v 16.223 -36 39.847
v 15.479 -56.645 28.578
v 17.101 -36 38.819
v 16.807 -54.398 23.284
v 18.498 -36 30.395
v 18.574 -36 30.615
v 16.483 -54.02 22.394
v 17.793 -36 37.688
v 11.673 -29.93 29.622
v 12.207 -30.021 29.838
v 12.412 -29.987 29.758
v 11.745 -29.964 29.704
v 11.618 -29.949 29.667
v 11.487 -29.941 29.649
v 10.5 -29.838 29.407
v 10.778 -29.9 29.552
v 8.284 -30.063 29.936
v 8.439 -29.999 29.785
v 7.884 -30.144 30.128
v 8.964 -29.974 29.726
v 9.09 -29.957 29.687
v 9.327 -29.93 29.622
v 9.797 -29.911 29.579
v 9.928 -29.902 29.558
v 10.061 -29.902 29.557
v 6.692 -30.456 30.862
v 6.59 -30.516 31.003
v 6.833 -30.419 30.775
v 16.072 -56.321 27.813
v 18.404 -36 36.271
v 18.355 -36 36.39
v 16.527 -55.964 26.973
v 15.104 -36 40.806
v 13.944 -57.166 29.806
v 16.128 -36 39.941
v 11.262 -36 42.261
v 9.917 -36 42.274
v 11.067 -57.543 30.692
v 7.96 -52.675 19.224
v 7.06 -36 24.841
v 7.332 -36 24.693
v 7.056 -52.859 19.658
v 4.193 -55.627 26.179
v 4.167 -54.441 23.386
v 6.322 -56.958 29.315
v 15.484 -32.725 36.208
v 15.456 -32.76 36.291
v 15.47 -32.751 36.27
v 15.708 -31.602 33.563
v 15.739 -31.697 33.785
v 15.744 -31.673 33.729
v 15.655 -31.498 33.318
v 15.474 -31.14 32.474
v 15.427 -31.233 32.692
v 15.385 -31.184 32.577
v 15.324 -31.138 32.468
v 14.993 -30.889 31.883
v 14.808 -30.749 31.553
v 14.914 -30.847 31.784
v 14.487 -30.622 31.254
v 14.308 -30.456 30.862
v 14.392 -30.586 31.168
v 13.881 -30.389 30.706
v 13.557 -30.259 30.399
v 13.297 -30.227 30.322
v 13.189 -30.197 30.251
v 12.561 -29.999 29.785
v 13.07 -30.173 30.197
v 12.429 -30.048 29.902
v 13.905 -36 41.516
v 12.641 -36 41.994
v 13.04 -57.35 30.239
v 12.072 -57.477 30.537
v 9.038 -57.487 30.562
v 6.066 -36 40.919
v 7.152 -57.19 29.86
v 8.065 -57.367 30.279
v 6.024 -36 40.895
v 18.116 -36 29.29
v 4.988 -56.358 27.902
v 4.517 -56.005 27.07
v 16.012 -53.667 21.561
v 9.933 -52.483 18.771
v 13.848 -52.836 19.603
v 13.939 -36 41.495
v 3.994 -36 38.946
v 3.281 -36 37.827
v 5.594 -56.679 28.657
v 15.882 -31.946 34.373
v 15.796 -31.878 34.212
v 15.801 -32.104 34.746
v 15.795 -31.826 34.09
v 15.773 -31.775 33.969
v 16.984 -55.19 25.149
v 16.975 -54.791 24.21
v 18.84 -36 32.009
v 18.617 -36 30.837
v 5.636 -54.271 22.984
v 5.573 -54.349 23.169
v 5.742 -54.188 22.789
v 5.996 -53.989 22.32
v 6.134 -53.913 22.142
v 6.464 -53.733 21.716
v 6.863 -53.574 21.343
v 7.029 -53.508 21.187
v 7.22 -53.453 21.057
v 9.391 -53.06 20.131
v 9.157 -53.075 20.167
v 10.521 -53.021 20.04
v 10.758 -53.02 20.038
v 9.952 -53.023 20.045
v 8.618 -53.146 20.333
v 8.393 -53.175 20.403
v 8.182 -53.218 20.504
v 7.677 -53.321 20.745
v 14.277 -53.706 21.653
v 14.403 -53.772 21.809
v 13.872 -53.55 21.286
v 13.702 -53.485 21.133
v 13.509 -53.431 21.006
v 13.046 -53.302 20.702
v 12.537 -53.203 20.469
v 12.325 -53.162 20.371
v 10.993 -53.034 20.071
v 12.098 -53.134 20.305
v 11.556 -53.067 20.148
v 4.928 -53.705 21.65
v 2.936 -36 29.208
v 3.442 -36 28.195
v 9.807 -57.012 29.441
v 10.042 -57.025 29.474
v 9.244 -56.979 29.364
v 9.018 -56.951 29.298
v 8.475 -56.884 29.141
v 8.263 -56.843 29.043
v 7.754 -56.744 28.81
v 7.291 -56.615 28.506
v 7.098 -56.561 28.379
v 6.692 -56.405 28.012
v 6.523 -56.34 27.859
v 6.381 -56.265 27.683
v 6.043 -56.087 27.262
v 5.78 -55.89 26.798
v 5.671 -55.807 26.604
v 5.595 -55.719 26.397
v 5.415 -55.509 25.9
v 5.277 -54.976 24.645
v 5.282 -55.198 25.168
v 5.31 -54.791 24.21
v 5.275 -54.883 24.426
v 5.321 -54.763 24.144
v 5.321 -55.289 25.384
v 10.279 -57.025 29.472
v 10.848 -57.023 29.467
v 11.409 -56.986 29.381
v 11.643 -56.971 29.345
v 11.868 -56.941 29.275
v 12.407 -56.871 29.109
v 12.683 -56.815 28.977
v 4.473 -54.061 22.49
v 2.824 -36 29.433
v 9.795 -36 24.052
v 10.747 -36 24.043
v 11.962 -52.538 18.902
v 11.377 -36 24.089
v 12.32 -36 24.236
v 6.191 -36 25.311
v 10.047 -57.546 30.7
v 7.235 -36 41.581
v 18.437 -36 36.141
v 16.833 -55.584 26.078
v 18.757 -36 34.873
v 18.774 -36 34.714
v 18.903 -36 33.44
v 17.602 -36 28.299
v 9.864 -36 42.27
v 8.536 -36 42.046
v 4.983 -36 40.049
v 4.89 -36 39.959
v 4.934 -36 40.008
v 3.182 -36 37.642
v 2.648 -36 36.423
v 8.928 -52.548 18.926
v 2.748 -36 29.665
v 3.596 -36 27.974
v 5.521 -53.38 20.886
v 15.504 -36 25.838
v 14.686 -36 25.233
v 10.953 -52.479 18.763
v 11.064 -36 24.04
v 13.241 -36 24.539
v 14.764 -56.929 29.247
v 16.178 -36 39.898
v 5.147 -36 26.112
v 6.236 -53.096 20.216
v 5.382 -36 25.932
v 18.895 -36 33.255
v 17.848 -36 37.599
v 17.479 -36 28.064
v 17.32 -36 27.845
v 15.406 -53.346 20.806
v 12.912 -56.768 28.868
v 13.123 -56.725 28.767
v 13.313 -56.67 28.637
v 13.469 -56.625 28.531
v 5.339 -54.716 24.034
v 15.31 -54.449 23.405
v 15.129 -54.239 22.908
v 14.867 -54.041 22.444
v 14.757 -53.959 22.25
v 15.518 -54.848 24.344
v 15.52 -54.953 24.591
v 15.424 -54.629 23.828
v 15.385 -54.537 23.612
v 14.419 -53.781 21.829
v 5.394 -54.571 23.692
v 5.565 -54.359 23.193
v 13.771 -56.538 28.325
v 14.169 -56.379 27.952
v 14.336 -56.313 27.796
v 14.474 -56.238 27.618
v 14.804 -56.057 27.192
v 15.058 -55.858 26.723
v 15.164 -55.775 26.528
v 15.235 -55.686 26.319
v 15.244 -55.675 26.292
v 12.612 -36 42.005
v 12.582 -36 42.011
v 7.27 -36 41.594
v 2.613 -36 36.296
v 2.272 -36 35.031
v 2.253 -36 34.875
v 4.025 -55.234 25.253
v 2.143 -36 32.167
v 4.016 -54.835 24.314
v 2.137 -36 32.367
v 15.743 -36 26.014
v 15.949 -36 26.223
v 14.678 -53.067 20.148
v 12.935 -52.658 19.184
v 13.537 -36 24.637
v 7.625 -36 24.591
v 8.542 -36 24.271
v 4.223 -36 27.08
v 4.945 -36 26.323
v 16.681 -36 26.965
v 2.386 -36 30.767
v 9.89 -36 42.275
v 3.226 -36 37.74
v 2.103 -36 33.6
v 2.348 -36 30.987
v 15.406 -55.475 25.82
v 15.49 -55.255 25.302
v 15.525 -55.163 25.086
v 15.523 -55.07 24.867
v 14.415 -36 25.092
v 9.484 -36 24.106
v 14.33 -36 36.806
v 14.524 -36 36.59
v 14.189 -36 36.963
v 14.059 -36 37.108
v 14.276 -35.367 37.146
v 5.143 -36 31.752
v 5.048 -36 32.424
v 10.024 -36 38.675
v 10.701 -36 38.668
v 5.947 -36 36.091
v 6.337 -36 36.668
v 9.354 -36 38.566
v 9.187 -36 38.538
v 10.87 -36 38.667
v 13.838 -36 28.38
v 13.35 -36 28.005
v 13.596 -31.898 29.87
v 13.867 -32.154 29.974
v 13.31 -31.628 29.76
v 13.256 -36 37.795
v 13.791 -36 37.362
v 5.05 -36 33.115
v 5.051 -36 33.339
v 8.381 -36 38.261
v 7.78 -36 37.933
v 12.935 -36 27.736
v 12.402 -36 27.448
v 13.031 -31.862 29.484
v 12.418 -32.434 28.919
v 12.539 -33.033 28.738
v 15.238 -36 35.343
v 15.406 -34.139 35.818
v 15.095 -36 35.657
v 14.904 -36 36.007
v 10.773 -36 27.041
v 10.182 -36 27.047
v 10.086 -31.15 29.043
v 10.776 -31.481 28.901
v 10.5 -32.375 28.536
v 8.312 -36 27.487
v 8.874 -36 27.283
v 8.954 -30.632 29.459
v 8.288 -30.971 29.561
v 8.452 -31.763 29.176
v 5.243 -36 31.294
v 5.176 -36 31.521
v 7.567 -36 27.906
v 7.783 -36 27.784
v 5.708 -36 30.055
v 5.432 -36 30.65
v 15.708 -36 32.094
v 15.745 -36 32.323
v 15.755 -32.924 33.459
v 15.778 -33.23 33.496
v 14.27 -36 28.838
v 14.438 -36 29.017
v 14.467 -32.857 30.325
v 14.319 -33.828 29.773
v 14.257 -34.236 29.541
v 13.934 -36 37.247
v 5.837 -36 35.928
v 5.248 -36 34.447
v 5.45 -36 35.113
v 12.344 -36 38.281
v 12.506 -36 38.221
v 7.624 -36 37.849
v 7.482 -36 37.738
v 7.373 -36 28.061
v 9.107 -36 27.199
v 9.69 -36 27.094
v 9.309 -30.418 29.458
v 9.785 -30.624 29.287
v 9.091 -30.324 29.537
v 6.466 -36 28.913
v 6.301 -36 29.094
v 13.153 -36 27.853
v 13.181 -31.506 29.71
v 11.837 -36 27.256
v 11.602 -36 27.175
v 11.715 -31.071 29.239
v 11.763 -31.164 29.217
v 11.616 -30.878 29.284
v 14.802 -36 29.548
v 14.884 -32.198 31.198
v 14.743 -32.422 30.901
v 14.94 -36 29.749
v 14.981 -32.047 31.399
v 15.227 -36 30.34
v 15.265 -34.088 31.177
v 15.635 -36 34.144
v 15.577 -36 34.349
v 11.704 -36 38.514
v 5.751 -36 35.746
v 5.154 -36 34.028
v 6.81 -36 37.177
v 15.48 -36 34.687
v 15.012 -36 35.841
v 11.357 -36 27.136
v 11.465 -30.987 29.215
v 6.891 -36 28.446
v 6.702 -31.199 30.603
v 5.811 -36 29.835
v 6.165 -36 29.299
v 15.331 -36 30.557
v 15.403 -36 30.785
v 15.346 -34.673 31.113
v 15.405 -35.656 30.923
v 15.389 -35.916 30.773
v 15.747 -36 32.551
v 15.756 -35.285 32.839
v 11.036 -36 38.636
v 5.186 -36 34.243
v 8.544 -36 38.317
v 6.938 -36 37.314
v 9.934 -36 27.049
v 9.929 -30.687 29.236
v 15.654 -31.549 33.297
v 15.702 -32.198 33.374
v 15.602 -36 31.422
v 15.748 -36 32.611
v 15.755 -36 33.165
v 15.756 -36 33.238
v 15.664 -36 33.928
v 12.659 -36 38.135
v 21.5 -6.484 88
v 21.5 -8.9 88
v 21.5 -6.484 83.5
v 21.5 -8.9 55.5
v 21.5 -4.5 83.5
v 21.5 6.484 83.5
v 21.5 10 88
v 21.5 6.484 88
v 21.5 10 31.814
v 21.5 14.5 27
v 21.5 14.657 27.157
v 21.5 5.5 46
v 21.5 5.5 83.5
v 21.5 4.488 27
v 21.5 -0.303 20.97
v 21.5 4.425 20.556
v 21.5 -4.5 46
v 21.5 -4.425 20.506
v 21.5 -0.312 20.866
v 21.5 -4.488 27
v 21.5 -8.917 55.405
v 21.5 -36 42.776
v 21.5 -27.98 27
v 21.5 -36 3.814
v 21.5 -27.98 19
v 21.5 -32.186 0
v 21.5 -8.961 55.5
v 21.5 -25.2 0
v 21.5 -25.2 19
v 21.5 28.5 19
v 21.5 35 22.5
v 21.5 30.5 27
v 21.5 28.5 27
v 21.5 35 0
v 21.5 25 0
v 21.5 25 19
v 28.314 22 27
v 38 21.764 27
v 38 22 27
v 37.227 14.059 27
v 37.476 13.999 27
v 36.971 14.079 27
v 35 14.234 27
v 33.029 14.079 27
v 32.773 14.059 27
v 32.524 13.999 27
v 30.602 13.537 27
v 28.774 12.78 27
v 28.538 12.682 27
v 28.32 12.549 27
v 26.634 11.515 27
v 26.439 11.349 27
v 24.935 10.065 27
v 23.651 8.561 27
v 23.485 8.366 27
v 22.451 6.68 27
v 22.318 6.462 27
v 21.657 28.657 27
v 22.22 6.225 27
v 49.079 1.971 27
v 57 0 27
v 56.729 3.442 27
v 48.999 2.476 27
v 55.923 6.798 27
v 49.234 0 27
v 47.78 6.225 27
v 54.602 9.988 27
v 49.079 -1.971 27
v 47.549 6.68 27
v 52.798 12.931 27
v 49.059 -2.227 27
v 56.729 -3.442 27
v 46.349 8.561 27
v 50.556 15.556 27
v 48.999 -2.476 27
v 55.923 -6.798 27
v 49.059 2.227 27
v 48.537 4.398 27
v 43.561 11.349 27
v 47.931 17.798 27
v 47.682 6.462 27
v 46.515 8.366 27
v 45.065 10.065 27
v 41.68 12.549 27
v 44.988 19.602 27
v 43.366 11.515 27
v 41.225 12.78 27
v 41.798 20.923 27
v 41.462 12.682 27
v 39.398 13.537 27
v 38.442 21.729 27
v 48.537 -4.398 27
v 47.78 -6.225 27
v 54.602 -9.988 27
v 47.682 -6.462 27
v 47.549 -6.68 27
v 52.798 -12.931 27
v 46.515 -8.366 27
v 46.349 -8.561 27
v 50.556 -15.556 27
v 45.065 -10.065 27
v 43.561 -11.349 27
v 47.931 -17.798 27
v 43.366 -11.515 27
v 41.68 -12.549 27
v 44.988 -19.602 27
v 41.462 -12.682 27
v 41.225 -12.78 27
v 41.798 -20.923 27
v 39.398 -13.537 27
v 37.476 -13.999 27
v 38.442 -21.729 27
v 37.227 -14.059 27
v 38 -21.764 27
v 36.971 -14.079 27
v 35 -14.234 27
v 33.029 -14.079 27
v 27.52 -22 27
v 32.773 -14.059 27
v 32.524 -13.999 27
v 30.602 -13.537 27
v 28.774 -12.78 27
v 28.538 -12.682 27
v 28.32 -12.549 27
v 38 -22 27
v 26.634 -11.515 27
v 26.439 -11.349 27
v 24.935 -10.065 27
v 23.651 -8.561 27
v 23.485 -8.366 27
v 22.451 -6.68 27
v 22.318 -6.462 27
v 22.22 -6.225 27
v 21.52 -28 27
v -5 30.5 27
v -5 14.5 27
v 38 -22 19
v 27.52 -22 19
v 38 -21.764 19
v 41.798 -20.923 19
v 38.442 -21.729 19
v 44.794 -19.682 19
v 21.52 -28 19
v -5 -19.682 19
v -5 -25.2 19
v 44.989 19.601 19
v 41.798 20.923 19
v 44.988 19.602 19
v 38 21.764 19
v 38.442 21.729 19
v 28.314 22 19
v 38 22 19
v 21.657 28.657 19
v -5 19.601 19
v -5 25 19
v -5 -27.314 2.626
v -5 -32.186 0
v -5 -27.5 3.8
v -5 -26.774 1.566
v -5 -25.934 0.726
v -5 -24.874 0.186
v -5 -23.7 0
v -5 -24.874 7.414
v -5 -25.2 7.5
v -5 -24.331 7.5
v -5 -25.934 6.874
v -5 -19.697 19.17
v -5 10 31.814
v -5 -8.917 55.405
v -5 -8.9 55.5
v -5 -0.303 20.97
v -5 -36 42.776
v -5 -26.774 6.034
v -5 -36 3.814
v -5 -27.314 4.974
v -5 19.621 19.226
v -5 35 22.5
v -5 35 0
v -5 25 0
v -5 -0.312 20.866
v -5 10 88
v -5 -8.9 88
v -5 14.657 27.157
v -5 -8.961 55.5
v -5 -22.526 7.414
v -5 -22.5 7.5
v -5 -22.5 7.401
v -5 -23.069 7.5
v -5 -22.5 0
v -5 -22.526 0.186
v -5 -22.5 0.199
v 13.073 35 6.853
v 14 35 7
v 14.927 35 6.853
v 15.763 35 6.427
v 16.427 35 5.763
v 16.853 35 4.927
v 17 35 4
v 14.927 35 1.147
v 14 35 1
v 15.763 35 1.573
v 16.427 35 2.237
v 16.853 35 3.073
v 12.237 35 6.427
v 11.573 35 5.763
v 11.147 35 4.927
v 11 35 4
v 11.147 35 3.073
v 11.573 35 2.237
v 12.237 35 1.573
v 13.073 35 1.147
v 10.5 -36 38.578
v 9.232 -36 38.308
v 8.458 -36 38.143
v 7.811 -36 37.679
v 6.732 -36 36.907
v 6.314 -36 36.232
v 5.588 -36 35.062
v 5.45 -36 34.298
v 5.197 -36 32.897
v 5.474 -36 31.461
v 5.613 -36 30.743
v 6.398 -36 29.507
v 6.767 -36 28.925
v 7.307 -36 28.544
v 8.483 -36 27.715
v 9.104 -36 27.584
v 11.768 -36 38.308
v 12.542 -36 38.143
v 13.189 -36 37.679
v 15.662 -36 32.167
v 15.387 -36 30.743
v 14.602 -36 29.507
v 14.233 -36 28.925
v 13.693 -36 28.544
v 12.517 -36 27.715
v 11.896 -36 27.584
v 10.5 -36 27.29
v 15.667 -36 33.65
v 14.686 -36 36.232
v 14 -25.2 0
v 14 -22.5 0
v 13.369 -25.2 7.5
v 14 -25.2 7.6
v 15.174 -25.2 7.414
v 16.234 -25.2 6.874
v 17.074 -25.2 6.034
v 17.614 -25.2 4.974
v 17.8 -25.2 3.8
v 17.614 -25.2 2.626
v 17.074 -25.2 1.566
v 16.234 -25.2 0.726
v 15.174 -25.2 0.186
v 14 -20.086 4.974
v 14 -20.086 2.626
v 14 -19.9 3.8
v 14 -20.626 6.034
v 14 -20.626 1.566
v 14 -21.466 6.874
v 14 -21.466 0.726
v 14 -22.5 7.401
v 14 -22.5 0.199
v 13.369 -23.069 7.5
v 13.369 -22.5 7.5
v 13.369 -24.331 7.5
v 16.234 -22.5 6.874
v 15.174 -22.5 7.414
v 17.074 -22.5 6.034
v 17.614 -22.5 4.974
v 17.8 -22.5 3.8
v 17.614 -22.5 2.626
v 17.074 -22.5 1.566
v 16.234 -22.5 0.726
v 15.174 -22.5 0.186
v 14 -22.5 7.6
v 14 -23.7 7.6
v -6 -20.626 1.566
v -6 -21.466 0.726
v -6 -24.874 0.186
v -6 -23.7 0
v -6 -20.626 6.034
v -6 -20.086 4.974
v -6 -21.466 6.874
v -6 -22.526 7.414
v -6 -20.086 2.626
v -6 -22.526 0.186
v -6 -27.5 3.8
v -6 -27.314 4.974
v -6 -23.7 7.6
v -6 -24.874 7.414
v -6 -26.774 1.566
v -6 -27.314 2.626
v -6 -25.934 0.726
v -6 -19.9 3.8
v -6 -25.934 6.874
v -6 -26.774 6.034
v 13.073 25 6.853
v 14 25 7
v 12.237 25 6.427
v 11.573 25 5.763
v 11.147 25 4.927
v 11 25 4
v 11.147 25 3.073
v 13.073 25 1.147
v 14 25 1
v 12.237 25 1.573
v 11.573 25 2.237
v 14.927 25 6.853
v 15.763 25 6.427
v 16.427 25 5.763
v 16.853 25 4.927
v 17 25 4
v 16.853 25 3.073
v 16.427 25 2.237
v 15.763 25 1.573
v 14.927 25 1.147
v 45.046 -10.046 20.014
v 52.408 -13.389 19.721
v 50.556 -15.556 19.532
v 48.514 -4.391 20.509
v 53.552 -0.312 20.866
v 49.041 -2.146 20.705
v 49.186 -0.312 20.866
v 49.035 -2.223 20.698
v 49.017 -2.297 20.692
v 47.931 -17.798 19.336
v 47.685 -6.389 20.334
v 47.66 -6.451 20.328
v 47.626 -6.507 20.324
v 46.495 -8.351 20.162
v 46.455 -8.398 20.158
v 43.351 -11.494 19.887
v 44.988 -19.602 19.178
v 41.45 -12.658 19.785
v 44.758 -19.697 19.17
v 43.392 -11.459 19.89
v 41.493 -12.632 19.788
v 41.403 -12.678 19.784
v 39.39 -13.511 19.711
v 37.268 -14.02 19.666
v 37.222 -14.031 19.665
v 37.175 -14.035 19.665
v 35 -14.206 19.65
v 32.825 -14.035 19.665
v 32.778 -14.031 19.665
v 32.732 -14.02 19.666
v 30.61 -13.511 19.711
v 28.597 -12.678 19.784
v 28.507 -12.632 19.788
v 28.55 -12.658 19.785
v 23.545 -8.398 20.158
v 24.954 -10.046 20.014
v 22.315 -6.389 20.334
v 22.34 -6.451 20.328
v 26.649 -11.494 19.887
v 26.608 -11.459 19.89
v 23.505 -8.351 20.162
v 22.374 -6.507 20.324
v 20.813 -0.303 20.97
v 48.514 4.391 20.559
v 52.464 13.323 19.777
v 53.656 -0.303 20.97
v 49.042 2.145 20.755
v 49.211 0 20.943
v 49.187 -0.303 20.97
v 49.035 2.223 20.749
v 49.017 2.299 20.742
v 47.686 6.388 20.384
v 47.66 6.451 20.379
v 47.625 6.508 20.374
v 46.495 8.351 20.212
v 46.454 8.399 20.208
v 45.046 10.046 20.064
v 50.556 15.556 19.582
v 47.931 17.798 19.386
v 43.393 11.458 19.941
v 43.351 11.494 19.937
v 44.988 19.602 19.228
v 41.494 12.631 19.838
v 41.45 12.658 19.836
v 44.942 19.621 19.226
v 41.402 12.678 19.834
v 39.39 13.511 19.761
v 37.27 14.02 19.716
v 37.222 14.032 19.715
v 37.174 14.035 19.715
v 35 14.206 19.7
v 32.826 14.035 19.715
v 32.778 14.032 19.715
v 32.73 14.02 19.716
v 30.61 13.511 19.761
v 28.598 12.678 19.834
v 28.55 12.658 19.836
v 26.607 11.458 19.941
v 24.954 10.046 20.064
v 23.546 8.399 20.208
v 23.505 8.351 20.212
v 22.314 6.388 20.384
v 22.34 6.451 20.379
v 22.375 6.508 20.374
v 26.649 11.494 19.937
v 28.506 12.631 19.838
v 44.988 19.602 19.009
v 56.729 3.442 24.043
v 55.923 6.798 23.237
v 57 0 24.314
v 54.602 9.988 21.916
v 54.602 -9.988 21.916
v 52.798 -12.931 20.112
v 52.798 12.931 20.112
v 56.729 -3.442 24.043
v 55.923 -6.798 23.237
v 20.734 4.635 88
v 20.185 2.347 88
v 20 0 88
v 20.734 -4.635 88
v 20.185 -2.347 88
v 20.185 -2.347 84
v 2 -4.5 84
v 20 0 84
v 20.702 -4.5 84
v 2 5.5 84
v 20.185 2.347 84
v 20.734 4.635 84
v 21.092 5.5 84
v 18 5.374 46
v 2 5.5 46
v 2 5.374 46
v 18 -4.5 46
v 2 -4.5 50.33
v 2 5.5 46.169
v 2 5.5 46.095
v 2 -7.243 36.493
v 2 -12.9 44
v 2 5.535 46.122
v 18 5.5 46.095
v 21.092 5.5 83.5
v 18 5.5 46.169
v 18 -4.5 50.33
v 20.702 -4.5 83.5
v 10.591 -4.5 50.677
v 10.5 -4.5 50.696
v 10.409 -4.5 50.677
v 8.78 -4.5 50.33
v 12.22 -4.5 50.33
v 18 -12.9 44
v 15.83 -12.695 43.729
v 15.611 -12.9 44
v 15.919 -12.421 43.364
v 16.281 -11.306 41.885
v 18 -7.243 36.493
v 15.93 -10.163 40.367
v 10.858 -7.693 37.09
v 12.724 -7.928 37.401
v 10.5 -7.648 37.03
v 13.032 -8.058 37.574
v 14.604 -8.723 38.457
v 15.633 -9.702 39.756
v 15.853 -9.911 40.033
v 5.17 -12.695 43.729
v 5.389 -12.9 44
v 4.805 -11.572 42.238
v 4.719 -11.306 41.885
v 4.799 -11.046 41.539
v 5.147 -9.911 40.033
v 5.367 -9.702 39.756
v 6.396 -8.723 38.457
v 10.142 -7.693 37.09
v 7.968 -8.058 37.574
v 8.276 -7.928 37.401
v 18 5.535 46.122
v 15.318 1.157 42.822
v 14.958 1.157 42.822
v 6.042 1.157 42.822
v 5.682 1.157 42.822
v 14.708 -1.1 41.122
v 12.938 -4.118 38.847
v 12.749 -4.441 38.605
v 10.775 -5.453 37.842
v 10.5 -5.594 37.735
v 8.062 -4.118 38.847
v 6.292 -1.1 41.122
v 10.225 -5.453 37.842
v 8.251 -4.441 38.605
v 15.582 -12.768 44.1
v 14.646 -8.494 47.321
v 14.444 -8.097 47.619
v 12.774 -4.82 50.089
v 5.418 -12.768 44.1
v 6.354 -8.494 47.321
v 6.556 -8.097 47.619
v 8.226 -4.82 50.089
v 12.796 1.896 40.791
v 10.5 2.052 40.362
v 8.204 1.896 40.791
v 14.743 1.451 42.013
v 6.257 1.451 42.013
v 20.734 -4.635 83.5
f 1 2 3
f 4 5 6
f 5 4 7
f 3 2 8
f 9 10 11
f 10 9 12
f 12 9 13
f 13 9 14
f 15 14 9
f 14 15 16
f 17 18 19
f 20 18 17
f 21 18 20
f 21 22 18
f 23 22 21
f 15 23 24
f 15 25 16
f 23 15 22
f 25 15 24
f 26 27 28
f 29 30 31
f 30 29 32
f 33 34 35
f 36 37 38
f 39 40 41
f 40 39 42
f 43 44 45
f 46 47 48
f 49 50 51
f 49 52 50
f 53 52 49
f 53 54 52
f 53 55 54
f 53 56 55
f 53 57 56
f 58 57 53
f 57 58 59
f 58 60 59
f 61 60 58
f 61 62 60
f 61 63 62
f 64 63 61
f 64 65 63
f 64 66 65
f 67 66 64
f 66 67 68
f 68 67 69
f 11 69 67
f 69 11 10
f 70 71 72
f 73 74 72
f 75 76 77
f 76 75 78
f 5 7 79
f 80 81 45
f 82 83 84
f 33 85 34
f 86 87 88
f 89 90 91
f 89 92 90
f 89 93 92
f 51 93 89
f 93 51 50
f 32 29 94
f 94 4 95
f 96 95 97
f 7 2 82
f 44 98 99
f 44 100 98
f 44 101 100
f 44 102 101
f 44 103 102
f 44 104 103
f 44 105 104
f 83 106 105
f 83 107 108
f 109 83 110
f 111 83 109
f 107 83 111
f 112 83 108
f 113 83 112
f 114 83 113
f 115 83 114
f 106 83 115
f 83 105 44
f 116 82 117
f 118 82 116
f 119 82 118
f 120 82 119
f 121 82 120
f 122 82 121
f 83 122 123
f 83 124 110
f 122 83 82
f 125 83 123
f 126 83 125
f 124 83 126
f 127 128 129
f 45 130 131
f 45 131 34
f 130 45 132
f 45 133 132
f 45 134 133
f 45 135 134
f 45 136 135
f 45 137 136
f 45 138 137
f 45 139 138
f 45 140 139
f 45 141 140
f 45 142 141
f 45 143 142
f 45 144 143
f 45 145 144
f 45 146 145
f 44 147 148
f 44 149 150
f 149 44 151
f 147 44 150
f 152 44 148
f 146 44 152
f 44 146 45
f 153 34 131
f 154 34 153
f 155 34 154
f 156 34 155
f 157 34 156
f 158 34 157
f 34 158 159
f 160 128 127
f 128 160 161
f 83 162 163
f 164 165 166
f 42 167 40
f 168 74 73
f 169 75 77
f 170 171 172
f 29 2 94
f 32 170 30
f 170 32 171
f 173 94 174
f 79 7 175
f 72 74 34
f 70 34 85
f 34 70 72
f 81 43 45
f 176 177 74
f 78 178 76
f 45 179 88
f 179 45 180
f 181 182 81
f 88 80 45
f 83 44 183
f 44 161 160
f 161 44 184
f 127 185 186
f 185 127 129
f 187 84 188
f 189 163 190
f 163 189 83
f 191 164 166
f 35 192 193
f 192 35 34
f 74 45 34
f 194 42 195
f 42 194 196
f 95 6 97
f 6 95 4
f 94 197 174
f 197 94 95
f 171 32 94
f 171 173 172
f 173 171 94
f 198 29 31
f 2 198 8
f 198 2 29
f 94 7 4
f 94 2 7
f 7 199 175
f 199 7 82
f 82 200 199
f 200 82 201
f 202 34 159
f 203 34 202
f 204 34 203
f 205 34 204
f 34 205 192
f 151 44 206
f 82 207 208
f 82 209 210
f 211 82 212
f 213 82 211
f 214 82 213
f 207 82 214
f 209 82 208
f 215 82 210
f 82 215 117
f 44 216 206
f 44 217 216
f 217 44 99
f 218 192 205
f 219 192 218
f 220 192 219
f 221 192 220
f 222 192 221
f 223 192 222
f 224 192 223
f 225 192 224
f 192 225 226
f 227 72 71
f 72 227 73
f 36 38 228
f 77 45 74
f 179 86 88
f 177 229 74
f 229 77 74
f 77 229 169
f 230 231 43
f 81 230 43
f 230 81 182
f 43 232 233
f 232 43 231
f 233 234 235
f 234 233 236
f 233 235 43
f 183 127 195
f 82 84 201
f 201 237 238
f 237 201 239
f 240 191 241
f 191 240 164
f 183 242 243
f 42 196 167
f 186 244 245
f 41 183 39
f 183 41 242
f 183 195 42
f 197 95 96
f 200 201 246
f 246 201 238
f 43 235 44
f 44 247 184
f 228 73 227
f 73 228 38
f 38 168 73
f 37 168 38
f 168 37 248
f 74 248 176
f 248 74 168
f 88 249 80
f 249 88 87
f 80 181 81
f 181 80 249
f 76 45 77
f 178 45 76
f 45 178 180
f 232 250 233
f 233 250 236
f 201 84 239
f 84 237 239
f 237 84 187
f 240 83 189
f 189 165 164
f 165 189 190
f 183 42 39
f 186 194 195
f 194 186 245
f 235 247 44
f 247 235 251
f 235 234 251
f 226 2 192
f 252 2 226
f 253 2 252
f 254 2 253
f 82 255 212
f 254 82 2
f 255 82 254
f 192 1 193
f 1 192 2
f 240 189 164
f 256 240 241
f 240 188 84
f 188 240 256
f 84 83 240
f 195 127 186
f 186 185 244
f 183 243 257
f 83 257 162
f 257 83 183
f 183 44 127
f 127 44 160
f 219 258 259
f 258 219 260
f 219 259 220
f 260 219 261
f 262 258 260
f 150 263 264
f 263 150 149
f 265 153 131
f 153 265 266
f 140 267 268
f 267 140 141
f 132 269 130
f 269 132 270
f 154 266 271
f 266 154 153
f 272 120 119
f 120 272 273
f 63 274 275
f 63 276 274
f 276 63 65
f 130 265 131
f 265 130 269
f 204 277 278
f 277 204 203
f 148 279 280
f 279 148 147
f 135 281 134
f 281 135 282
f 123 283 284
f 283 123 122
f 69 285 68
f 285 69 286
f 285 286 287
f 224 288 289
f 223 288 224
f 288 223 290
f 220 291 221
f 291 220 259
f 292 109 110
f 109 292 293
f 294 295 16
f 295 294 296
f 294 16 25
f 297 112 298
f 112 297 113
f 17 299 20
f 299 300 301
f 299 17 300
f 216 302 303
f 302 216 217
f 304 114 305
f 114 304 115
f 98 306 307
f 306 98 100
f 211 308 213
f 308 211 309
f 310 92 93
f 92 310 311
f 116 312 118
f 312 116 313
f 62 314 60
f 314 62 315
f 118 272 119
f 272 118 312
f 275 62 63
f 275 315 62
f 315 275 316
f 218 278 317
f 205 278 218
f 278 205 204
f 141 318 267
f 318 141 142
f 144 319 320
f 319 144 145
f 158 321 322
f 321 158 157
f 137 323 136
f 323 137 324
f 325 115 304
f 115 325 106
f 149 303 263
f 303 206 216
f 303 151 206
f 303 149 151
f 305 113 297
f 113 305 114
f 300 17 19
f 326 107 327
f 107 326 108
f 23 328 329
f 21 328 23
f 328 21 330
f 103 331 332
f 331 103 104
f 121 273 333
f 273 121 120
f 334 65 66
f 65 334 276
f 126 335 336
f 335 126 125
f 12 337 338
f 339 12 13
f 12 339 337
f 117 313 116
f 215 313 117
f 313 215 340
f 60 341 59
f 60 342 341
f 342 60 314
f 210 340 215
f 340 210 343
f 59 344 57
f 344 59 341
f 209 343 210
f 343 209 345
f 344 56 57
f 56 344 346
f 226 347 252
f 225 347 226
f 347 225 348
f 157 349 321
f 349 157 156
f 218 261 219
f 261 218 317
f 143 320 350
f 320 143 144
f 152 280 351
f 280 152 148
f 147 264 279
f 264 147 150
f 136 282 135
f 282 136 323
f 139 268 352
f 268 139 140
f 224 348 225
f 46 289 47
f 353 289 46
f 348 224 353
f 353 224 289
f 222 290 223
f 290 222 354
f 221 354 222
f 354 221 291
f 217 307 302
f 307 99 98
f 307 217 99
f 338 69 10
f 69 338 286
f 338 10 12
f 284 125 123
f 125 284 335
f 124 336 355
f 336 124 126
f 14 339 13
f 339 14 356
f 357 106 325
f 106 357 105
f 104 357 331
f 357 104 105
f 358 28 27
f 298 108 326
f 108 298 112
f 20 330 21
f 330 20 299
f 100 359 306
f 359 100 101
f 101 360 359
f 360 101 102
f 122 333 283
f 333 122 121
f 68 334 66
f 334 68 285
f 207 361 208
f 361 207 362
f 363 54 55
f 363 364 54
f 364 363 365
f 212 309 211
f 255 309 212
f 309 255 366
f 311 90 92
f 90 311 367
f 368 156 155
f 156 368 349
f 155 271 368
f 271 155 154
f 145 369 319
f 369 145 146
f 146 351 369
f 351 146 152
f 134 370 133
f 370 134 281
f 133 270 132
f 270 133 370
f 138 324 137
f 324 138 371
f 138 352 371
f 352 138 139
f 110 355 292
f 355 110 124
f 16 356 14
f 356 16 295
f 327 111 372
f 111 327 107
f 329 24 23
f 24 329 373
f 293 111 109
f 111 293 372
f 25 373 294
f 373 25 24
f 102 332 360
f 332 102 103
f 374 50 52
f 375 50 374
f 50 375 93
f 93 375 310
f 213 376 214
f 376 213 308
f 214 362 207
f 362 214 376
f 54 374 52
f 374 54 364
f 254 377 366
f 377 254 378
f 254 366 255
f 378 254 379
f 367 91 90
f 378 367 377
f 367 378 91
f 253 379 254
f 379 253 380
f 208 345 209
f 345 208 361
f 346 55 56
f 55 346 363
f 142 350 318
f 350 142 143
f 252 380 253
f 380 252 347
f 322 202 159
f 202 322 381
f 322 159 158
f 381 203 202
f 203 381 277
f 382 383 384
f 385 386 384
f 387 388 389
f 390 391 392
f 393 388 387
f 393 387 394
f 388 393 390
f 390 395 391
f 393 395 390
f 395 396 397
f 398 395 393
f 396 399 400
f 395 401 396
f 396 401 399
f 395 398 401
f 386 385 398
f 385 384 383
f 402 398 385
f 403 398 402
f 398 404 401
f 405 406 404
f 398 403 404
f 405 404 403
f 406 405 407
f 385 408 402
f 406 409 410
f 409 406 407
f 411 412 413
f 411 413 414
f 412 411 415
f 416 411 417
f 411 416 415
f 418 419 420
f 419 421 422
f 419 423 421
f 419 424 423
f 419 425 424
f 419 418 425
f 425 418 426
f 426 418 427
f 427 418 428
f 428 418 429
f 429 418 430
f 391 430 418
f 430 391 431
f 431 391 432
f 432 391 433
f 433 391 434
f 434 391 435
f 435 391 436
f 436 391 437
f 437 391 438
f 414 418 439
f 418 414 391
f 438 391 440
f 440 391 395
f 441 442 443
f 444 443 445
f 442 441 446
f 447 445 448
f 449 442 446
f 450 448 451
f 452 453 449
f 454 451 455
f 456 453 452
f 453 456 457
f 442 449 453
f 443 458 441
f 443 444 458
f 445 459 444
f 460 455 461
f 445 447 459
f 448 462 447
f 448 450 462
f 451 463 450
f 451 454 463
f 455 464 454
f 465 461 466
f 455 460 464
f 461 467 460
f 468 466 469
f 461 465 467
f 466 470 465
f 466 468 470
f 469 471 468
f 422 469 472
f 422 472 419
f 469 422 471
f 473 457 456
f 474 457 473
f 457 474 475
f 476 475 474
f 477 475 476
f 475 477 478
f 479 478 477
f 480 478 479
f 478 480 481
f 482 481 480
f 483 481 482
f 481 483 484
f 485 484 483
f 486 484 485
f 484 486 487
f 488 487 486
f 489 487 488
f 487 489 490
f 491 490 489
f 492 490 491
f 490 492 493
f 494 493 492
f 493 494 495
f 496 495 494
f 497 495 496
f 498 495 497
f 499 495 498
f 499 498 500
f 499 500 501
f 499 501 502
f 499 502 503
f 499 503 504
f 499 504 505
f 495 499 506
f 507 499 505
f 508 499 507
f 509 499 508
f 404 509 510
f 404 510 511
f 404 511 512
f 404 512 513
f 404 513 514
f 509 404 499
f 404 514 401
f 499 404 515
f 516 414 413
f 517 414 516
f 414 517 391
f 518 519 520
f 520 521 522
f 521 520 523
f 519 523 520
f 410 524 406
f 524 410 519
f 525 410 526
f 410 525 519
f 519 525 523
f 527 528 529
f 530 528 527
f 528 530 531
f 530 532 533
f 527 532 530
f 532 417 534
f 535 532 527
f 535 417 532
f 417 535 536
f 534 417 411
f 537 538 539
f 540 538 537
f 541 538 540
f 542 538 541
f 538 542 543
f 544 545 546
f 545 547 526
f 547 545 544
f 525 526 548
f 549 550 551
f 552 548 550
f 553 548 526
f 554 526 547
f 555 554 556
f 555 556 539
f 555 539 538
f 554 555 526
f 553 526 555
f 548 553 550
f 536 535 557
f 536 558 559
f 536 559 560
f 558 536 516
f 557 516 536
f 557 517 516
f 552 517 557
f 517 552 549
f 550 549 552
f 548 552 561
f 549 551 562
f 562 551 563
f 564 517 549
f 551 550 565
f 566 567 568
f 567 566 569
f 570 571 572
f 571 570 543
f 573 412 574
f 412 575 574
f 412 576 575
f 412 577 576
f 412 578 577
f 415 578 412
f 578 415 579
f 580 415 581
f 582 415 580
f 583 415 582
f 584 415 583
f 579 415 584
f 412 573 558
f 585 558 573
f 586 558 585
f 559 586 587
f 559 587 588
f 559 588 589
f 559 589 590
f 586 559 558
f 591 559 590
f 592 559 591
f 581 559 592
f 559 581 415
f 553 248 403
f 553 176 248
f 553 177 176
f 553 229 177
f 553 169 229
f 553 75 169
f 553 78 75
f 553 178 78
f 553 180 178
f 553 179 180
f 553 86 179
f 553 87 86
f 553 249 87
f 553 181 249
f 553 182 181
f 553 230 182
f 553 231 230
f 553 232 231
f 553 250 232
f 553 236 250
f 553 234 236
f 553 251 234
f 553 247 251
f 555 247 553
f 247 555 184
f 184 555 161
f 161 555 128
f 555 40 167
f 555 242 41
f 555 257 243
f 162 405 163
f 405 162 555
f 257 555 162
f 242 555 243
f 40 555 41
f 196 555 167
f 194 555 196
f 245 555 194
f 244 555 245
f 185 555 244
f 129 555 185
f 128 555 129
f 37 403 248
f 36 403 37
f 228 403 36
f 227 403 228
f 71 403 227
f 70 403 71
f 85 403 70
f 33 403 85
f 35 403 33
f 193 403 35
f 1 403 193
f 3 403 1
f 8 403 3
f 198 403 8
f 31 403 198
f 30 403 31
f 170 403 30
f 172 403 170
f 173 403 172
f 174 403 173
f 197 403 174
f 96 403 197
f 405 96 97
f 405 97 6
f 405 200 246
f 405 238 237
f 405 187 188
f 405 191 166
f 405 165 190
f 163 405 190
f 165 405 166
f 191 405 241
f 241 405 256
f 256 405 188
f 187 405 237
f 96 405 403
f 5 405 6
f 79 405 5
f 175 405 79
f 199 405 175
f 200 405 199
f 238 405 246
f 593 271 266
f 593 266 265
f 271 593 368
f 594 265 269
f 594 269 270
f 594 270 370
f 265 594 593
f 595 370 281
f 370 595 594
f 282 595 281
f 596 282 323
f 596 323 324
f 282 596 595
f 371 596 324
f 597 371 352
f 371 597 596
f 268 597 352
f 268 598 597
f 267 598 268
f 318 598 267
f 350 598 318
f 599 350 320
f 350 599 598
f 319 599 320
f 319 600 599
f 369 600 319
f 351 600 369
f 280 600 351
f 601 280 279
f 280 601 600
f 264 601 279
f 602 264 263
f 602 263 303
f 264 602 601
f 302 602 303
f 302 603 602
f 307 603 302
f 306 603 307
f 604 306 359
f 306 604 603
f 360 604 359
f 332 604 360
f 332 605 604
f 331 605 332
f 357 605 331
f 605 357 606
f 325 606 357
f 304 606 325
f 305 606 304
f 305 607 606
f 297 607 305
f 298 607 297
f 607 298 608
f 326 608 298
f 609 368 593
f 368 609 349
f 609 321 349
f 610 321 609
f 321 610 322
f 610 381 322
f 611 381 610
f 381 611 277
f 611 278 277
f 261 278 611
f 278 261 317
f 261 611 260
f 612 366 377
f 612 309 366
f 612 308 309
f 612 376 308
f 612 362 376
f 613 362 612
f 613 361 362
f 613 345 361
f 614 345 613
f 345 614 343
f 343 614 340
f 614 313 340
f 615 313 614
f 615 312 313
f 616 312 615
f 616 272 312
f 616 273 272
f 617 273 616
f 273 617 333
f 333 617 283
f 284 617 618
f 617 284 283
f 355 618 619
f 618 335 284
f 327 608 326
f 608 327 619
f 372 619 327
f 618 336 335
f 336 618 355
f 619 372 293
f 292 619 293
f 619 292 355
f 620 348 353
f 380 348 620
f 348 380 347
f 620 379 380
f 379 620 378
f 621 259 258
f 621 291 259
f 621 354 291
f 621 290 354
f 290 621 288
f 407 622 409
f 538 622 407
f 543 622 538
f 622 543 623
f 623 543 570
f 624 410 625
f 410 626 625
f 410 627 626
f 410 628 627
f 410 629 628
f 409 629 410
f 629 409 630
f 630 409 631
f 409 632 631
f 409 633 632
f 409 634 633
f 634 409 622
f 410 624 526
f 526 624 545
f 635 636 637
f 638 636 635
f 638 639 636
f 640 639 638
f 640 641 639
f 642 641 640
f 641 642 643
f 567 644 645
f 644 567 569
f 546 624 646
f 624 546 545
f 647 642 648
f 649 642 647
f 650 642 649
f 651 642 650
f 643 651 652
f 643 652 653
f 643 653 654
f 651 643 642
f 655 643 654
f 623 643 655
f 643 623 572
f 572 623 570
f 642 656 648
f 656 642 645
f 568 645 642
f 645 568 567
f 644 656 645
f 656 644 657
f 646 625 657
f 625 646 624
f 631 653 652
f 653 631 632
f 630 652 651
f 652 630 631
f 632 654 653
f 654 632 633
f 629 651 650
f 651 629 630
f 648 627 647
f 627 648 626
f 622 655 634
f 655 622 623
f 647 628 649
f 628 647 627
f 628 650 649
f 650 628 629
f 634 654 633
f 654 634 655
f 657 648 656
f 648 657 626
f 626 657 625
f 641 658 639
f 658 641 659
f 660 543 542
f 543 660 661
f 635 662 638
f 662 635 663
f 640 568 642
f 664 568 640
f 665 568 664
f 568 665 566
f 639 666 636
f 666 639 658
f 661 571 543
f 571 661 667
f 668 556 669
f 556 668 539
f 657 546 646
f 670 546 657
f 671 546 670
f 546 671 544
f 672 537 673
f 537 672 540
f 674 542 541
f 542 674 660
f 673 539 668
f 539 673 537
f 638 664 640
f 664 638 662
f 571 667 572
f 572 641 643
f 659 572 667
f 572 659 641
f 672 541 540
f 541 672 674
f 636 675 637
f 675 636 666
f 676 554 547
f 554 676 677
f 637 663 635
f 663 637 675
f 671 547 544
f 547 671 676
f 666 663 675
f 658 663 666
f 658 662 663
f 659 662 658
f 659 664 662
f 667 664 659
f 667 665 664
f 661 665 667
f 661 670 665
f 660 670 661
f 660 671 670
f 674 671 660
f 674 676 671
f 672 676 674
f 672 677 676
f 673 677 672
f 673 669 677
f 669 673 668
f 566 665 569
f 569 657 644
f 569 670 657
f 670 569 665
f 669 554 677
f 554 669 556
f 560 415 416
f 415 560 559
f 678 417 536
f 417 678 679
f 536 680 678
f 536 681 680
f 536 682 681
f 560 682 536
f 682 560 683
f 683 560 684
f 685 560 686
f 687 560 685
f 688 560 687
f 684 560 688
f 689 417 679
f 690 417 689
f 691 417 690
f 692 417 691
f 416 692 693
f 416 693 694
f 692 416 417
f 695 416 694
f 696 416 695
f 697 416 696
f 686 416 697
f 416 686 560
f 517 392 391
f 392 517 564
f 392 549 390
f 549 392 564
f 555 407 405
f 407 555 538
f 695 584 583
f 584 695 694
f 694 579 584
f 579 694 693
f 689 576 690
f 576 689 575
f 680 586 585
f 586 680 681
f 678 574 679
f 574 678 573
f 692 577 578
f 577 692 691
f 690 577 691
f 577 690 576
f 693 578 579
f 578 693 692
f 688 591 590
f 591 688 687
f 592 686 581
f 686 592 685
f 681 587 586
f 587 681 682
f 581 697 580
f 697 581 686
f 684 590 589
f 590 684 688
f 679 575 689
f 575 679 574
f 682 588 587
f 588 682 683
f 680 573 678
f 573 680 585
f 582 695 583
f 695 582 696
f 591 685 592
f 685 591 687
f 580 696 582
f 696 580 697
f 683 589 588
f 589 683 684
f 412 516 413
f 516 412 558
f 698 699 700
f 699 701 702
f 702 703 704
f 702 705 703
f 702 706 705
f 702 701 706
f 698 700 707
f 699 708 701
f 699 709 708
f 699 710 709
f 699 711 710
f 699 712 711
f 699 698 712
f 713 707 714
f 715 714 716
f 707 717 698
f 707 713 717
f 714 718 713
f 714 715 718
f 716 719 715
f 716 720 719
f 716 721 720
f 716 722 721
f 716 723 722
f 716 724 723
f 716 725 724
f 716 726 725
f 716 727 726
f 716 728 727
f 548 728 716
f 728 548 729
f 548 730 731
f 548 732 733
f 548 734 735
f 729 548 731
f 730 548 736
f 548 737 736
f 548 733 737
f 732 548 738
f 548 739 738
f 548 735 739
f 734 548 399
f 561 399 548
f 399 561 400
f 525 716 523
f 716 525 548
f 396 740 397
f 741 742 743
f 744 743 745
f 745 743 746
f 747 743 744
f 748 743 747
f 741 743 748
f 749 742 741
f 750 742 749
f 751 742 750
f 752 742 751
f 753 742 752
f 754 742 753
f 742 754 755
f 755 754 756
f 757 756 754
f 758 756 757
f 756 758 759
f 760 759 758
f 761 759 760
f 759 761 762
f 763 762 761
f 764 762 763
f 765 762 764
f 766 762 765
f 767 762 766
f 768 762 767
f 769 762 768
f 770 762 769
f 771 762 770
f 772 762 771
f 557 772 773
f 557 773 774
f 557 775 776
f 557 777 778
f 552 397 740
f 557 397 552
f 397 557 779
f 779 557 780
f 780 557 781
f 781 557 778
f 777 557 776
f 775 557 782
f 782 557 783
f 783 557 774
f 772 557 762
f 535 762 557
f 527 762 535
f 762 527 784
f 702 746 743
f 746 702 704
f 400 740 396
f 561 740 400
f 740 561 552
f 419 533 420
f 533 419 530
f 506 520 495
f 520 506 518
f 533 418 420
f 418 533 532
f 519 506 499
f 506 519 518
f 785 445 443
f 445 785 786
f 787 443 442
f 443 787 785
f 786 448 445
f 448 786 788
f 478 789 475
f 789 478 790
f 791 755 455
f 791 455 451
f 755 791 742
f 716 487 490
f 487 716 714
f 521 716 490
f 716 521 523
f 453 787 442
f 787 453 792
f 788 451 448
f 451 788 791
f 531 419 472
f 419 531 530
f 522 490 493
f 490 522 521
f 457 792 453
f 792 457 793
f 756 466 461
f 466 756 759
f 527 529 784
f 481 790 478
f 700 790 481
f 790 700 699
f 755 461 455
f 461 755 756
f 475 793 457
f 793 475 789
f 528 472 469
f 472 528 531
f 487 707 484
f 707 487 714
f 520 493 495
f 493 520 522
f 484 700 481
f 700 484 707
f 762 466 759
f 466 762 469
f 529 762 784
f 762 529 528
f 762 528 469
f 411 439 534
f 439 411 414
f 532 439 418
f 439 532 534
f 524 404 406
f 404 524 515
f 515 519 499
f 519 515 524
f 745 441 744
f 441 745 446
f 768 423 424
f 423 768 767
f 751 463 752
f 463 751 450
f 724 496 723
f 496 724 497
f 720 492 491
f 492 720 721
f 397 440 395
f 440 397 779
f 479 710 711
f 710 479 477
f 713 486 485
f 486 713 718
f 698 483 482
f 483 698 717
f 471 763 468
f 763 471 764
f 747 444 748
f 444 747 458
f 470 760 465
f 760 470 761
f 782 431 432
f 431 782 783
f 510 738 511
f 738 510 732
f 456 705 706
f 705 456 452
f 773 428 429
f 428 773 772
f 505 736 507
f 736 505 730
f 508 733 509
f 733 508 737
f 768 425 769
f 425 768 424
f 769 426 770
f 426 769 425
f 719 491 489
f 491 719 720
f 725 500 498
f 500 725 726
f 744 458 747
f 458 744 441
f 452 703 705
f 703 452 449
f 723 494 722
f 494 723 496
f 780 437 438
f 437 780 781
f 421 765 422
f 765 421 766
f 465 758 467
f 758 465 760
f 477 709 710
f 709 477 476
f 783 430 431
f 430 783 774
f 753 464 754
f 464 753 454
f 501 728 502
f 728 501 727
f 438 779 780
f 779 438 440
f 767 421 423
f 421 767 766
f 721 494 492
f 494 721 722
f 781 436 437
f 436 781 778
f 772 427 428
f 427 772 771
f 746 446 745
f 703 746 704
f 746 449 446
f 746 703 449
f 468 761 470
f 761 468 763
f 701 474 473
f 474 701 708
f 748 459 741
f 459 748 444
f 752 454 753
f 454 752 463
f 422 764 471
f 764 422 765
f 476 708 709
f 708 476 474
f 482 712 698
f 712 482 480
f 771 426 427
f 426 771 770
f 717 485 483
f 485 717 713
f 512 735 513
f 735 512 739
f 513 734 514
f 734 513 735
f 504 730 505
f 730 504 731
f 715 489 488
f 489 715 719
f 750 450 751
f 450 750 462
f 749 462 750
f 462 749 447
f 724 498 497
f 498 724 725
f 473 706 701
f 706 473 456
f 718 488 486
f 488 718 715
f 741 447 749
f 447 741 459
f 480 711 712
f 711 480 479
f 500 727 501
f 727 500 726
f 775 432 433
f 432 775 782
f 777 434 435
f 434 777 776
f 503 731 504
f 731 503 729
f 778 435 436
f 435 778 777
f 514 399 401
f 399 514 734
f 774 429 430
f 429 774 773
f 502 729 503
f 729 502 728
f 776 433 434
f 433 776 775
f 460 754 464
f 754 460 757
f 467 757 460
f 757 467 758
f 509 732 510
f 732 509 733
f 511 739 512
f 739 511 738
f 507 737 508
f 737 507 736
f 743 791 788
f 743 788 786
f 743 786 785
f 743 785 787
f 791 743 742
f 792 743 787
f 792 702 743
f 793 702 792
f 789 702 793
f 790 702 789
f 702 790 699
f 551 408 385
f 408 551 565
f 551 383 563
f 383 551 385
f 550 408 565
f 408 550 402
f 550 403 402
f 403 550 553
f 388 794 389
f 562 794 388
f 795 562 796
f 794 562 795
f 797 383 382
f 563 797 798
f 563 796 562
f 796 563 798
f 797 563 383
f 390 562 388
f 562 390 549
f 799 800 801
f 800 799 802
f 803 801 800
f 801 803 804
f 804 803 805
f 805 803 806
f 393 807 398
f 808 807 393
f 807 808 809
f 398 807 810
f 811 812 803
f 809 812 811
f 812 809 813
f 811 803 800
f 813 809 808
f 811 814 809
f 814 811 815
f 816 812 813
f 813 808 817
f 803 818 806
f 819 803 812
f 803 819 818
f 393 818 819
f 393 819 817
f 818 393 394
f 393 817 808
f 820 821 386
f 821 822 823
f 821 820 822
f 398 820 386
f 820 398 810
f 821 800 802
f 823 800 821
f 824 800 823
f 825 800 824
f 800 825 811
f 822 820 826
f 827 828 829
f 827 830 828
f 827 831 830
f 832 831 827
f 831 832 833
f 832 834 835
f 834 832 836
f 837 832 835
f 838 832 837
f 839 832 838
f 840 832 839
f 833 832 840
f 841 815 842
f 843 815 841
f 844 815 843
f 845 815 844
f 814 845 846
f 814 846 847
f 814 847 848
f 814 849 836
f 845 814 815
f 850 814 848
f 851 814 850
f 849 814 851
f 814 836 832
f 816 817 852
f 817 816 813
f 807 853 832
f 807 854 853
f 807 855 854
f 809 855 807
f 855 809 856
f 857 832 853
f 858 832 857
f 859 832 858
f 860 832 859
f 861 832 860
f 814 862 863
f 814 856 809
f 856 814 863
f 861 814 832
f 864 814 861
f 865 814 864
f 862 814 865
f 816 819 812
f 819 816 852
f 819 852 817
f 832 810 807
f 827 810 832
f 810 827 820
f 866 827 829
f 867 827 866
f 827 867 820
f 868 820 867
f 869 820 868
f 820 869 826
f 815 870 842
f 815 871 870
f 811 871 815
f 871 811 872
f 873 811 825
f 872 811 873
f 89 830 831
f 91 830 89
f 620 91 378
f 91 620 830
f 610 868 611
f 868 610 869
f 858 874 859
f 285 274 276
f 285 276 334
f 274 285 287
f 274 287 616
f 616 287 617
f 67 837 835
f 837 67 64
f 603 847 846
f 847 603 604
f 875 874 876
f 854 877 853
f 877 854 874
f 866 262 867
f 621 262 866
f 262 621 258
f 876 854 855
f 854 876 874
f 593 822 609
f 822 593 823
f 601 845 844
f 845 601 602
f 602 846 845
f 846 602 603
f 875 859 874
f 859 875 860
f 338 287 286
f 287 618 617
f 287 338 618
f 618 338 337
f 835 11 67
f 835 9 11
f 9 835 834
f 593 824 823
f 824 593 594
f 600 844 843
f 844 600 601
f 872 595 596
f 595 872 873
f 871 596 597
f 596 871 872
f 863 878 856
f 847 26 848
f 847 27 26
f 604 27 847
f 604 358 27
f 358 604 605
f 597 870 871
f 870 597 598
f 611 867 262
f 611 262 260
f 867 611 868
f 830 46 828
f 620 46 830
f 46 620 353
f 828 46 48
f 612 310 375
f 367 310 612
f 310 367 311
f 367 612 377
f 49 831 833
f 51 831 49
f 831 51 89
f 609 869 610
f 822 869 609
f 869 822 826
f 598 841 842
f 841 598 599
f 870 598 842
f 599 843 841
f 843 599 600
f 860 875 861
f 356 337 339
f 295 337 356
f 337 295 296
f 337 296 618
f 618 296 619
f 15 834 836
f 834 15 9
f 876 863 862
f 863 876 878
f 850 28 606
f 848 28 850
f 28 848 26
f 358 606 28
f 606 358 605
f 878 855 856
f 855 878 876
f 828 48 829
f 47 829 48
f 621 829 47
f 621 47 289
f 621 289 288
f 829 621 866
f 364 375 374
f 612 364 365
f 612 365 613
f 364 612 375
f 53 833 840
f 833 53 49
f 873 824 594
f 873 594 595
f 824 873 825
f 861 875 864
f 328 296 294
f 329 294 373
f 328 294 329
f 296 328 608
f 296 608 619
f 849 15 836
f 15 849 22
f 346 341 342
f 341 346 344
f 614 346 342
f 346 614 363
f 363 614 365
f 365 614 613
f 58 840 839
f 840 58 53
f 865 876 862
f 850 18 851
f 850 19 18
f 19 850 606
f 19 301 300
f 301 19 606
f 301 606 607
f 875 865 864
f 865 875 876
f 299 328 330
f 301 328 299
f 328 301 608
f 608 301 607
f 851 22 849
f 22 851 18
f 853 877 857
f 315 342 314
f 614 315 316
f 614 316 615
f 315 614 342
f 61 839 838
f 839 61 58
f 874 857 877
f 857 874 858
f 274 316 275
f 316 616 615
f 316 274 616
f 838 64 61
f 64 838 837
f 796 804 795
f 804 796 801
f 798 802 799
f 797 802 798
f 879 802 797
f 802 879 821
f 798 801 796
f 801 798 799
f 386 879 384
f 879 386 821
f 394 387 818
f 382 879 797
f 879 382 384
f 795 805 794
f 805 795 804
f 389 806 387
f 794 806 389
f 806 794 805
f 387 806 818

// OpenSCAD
// Decapping tray for hose collection V4  3.28.2013
// fits RCBS Rock Chucker Supreme and replaces the 
// factory piece, an inverted Y with 2 big feet.
// Spent primer falls in 0.5" ID clear plastic tubing
// for collection in bottle on floor or below shelf.
// Left hand version to give minimum
// interference with handling large cases.

// Held in place by ring that goes around the ram.
// Remove shellholder before installing or removal
// Shorten travel of arm so case is loaded a little 
// above the plastic ring.   The lip on left edge 
// holds the adapter to the groove in cast frame.
// Back centers the device close to ram
// Configuration for lefthand hose

// prints on back with support.  
// Clear ramp to hose after printing.

// heat_shield_end(x,y,z,skirt,thickness,bridge)

{
// draw LHnozzle
rotate([0,-90,0])

difference() {	
	union() {
		translate([34.5,-32,-10.5])
		rotate([90,50,-23])
		cylinder(r1=8.8, r2=6.5, h=25,$fn=40);
	
			}
	translate([37.5,-25,-10.4])
	rotate([90,50,-23])
	cylinder(r1=5.5, r2=5, h=45,$fn=40);
		}
// draw basebar
	difference() {	
		union() {
			translate([-5,-36,19])
			cube([26.5,71,8]);
			// hook on left side
			translate([-5,-36,0])
			cube([26.5,10.8,19]);
			translate([-5,-30,0])
			cube([19,7.5,7.5]);
			translate([14,-35,3.8])
			rotate([-90,0,0])
			cylinder(r=3.8,h=12.5, $fn=20);
			translate([-6,-23.7,3.8])
			rotate([0,90,0])
			cylinder(r=3.8,h=20, $fn=20);
			// straight piece on right side
			translate([-5,25,0])
			cube([26.5,10,19]);
			translate([-5,-5,25])
			cube([5,10,40]);
		translate([-5,9,21.5])
		rotate(a=45, v=[90,0,0])
		cube([26.5,8,8]);
				}
		translate([-6,-36.5,-7])
		rotate(a=45, v=[90,0,0])
		cube([30,8,8]);
		translate([14,20, 4])
		rotate([-90,0,0])
		cylinder(r=3,h=24, $fn=20);
		translate([-6,35.5,22])
		rotate(a=45, v=[90,0,0])
		cube([30,8,8]);
		translate([-6,-19,11.2])
		rotate([5,0,0])
		cube([65,20,8]);
		translate([-6,-1,13])
		rotate([-5,0,0])
		cube([65,20,8]);
		
// SCAD feature!  have to duplicate the cut
// drill cylinder to hose fitting
		translate([10.5,0,45.5])
		rotate([110,0,0])
		cylinder(r1=6, r2=5,h=55, $fn=40);
			}		

// draw ramring
	difference() {
		union() {
			translate([20,-22,19])
			cube([18,44,8]);
			translate([35,0,19])
			rotate([0,0,0])
			cylinder(r=22,h=8, $fn=40);
		translate([16,23,19])
		rotate(a=45, v=[0,0,-45])
		cube([10,8,8]);
		translate([21.52,-28, 19])
		rotate(a=45, v=[0,0,45])
		cube([10,8,8]);
				}
		translate([35,0,18])
		rotate([0,0,0])
		cylinder(r1=14.2, r2=14.5,h=80, $fn=40);
		translate([57,-20,13])
		rotate([45,0,90])
		cube([44,8,8]);
		translate([-6,-19,11.2])
		rotate([5,0,0])
		cube([65,20,8]);
		translate([-6,-1,13])
		rotate([-5,0,0])
		cube([65,20,8]);
			} 

// draw lefthand ramp
	difference() 
		{
		translate([-5,-36,26])
		cube([26.5,46,62]);
	// subtract primer catch zone
		translate([2,-4.5,46])
		cube([21.5,10,38]);
		translate([2,-12.9,44])
		rotate([-53,0,0])
		cube([16,9.4,16]);
	// cut away excess corner
		union() {
			translate([-6,-38.9,55.5])
			cube([34,30,40]);
			translate([-6,-80.2,66.3])
			rotate([-65,0,0])
			cube([34,40,60]);
				}
	// drill cylinder to hose fitting
		translate([10.5,0,46])
		rotate([110,0,0])
		cylinder(r1=6, r2=5,h=55, $fn=16);
	// relief for ram cylinder at top stroke
		translate([35,0,83.5])
		rotate([0,0,0])
		cylinder(r1=15, r2=15,h=5, $fn=40);
			}
// add on Heat Shields to reduce warping
// comment out next 7 lines to omit shields
//	rotate([0,90,0])
//	translate([-77,0.5,-5])
//	heat_shield_end(26,22,26,10,2,1);
//	rotate([90,-90,90])	translate([-3,-37.5,-5])
//	heat_shield_corner(20,20,26,10,2,1,90);
//	rotate([90,0,90])  translate([-38,-1.5,-5])
//	heat_shield_corner(20,20,26,10,2,1,90);	
}

//  Heat_Shield.scad
// available module calls:
// heat_shield_end(x,y,z,skirt,thickness,bridge)
// heat_shield_corner(x,y,z,skirt,thickness,bridge,angle)
//
// No intrinsic rotation.  Long side +x direction
//
//  Check lifting with ABS
//  disposable heat shield for the end of a long bar....
//
//   goes around long ends
//   to prevent lifting while printing
//   x, y, z are the inside dimensions
//   skirt is the adhesion pad width
//   thickness is the skirt thickness (nominal=1)
//   bridge is the contact thickness connecting the long end
//   Note: if no bridge is desired use bridge=-1
//
module heat_shield_end(x,y,z,skirt,thickness,bridge) {
      translate ([0, 0, z/2]) {
           // corner adhesion pads
            color([ 1.0, 0, 0,])  {
                translate ([x/2, y/2+skirt/2, -(z-thickness)/2]) {
                   cylinder (h=thickness, r=skirt/2, $fa=2, center = true);}
                translate ([-x/2-skirt/2, y/2+skirt/2, -(z-thickness)/2]) {
                   cylinder (h=thickness, r=skirt/2, $fa=2, center = true);}
                translate ([x/2, -y/2-skirt/2, -(z-thickness)/2]) {
                   cylinder (h=thickness, r=skirt/2, $fa=2, center = true);}
                translate ([-x/2-skirt/2, -y/2-skirt/2, -(z-thickness)/2]) {
                   cylinder (h=thickness, r=skirt/2, $fa=2, center = true);}
           // corner adhesion bars
                translate ([-skirt/4, -y/2-skirt/2, -(z-thickness)/2]) {
                   cube(size=[x+skirt/2, skirt, thickness], center=true); }
                translate ([-skirt/4, y/2+skirt/2, -(z-thickness)/2]) {
                   cube(size=[x+skirt/2, skirt, thickness], center=true); }
                translate ([-x/2-skirt/2, 0, -(z-thickness)/2]) {
                   cube(size=[skirt, y+skirt, thickness], center=true); }
             }
         difference()
         {
            color([ 1, 0, 0,])  { cube(size=[x+1, y+2, z], center=true); }
            translate ([1, 0, bridge+1]) {
               cube(size=[x+1, y, z+2], center=true); }
         }
      }
}


//   disposable heat shield for a corner or side angle ....
//
//   goes around long ends
//   to prevent lifting while printing
//   x, y, z are the lenghts of the x, y sections and z height
//   skirt is the adhesion pad width
//   thickness is the skirt thickness (nominal=1)
//   bridge is the contact thickness connecting to the piece
//   angle is the corner angle in degrees
//
module heat_shield_corner(x,y,z,skirt,thickness,bridge,angle) {
    //
            color([ 1.0, 0, 0,])  {
           // x bar and pads
                translate ([x/2, -0.5, z/2]) {
                   cube(size=[x+2, 1, z], center=true); }
                translate ([x, -skirt/2, thickness/2]) {
                   cylinder (h=thickness, r=skirt/2, $fa=2, center = true);}
                translate ([0, -skirt/2,  thickness/2]) {
                   cylinder (h=thickness, r=skirt/2, $fa=2, center = true);}
           // x skirt
                translate ([x/2, -skirt/2, thickness/2]) {
                   cube(size=[x, skirt, thickness], center=true); }
           // x bridge
                translate ([x/2, 3*bridge-1, bridge/2]) {
                   cube(size=[x, 6*bridge, bridge], center=true); }
          //
          //
               rotate ([0,0,angle]) {
           // y bar and pads
                translate ([y/2, 0.5, z/2]) {
                   cube(size=[y+2, 1, z], center=true); }
                translate ([y, skirt/2, thickness/2]) {
                   cylinder (h=thickness, r=skirt/2, $fa=2, center = true);}
                translate ([0, skirt/2, thickness/2]) {
                   cylinder (h=thickness, r=skirt/2, $fa=2, center = true);}
           // y skirt
                translate ([y/2, skirt/2, thickness/2]) {
                   cube(size=[y, skirt, thickness], center=true); }
           // y bridge
                translate ([y/2, -3*bridge+1, bridge/2]) {
                   cube(size=[y, 6*bridge, bridge], center=true); }
             }
      }
}
